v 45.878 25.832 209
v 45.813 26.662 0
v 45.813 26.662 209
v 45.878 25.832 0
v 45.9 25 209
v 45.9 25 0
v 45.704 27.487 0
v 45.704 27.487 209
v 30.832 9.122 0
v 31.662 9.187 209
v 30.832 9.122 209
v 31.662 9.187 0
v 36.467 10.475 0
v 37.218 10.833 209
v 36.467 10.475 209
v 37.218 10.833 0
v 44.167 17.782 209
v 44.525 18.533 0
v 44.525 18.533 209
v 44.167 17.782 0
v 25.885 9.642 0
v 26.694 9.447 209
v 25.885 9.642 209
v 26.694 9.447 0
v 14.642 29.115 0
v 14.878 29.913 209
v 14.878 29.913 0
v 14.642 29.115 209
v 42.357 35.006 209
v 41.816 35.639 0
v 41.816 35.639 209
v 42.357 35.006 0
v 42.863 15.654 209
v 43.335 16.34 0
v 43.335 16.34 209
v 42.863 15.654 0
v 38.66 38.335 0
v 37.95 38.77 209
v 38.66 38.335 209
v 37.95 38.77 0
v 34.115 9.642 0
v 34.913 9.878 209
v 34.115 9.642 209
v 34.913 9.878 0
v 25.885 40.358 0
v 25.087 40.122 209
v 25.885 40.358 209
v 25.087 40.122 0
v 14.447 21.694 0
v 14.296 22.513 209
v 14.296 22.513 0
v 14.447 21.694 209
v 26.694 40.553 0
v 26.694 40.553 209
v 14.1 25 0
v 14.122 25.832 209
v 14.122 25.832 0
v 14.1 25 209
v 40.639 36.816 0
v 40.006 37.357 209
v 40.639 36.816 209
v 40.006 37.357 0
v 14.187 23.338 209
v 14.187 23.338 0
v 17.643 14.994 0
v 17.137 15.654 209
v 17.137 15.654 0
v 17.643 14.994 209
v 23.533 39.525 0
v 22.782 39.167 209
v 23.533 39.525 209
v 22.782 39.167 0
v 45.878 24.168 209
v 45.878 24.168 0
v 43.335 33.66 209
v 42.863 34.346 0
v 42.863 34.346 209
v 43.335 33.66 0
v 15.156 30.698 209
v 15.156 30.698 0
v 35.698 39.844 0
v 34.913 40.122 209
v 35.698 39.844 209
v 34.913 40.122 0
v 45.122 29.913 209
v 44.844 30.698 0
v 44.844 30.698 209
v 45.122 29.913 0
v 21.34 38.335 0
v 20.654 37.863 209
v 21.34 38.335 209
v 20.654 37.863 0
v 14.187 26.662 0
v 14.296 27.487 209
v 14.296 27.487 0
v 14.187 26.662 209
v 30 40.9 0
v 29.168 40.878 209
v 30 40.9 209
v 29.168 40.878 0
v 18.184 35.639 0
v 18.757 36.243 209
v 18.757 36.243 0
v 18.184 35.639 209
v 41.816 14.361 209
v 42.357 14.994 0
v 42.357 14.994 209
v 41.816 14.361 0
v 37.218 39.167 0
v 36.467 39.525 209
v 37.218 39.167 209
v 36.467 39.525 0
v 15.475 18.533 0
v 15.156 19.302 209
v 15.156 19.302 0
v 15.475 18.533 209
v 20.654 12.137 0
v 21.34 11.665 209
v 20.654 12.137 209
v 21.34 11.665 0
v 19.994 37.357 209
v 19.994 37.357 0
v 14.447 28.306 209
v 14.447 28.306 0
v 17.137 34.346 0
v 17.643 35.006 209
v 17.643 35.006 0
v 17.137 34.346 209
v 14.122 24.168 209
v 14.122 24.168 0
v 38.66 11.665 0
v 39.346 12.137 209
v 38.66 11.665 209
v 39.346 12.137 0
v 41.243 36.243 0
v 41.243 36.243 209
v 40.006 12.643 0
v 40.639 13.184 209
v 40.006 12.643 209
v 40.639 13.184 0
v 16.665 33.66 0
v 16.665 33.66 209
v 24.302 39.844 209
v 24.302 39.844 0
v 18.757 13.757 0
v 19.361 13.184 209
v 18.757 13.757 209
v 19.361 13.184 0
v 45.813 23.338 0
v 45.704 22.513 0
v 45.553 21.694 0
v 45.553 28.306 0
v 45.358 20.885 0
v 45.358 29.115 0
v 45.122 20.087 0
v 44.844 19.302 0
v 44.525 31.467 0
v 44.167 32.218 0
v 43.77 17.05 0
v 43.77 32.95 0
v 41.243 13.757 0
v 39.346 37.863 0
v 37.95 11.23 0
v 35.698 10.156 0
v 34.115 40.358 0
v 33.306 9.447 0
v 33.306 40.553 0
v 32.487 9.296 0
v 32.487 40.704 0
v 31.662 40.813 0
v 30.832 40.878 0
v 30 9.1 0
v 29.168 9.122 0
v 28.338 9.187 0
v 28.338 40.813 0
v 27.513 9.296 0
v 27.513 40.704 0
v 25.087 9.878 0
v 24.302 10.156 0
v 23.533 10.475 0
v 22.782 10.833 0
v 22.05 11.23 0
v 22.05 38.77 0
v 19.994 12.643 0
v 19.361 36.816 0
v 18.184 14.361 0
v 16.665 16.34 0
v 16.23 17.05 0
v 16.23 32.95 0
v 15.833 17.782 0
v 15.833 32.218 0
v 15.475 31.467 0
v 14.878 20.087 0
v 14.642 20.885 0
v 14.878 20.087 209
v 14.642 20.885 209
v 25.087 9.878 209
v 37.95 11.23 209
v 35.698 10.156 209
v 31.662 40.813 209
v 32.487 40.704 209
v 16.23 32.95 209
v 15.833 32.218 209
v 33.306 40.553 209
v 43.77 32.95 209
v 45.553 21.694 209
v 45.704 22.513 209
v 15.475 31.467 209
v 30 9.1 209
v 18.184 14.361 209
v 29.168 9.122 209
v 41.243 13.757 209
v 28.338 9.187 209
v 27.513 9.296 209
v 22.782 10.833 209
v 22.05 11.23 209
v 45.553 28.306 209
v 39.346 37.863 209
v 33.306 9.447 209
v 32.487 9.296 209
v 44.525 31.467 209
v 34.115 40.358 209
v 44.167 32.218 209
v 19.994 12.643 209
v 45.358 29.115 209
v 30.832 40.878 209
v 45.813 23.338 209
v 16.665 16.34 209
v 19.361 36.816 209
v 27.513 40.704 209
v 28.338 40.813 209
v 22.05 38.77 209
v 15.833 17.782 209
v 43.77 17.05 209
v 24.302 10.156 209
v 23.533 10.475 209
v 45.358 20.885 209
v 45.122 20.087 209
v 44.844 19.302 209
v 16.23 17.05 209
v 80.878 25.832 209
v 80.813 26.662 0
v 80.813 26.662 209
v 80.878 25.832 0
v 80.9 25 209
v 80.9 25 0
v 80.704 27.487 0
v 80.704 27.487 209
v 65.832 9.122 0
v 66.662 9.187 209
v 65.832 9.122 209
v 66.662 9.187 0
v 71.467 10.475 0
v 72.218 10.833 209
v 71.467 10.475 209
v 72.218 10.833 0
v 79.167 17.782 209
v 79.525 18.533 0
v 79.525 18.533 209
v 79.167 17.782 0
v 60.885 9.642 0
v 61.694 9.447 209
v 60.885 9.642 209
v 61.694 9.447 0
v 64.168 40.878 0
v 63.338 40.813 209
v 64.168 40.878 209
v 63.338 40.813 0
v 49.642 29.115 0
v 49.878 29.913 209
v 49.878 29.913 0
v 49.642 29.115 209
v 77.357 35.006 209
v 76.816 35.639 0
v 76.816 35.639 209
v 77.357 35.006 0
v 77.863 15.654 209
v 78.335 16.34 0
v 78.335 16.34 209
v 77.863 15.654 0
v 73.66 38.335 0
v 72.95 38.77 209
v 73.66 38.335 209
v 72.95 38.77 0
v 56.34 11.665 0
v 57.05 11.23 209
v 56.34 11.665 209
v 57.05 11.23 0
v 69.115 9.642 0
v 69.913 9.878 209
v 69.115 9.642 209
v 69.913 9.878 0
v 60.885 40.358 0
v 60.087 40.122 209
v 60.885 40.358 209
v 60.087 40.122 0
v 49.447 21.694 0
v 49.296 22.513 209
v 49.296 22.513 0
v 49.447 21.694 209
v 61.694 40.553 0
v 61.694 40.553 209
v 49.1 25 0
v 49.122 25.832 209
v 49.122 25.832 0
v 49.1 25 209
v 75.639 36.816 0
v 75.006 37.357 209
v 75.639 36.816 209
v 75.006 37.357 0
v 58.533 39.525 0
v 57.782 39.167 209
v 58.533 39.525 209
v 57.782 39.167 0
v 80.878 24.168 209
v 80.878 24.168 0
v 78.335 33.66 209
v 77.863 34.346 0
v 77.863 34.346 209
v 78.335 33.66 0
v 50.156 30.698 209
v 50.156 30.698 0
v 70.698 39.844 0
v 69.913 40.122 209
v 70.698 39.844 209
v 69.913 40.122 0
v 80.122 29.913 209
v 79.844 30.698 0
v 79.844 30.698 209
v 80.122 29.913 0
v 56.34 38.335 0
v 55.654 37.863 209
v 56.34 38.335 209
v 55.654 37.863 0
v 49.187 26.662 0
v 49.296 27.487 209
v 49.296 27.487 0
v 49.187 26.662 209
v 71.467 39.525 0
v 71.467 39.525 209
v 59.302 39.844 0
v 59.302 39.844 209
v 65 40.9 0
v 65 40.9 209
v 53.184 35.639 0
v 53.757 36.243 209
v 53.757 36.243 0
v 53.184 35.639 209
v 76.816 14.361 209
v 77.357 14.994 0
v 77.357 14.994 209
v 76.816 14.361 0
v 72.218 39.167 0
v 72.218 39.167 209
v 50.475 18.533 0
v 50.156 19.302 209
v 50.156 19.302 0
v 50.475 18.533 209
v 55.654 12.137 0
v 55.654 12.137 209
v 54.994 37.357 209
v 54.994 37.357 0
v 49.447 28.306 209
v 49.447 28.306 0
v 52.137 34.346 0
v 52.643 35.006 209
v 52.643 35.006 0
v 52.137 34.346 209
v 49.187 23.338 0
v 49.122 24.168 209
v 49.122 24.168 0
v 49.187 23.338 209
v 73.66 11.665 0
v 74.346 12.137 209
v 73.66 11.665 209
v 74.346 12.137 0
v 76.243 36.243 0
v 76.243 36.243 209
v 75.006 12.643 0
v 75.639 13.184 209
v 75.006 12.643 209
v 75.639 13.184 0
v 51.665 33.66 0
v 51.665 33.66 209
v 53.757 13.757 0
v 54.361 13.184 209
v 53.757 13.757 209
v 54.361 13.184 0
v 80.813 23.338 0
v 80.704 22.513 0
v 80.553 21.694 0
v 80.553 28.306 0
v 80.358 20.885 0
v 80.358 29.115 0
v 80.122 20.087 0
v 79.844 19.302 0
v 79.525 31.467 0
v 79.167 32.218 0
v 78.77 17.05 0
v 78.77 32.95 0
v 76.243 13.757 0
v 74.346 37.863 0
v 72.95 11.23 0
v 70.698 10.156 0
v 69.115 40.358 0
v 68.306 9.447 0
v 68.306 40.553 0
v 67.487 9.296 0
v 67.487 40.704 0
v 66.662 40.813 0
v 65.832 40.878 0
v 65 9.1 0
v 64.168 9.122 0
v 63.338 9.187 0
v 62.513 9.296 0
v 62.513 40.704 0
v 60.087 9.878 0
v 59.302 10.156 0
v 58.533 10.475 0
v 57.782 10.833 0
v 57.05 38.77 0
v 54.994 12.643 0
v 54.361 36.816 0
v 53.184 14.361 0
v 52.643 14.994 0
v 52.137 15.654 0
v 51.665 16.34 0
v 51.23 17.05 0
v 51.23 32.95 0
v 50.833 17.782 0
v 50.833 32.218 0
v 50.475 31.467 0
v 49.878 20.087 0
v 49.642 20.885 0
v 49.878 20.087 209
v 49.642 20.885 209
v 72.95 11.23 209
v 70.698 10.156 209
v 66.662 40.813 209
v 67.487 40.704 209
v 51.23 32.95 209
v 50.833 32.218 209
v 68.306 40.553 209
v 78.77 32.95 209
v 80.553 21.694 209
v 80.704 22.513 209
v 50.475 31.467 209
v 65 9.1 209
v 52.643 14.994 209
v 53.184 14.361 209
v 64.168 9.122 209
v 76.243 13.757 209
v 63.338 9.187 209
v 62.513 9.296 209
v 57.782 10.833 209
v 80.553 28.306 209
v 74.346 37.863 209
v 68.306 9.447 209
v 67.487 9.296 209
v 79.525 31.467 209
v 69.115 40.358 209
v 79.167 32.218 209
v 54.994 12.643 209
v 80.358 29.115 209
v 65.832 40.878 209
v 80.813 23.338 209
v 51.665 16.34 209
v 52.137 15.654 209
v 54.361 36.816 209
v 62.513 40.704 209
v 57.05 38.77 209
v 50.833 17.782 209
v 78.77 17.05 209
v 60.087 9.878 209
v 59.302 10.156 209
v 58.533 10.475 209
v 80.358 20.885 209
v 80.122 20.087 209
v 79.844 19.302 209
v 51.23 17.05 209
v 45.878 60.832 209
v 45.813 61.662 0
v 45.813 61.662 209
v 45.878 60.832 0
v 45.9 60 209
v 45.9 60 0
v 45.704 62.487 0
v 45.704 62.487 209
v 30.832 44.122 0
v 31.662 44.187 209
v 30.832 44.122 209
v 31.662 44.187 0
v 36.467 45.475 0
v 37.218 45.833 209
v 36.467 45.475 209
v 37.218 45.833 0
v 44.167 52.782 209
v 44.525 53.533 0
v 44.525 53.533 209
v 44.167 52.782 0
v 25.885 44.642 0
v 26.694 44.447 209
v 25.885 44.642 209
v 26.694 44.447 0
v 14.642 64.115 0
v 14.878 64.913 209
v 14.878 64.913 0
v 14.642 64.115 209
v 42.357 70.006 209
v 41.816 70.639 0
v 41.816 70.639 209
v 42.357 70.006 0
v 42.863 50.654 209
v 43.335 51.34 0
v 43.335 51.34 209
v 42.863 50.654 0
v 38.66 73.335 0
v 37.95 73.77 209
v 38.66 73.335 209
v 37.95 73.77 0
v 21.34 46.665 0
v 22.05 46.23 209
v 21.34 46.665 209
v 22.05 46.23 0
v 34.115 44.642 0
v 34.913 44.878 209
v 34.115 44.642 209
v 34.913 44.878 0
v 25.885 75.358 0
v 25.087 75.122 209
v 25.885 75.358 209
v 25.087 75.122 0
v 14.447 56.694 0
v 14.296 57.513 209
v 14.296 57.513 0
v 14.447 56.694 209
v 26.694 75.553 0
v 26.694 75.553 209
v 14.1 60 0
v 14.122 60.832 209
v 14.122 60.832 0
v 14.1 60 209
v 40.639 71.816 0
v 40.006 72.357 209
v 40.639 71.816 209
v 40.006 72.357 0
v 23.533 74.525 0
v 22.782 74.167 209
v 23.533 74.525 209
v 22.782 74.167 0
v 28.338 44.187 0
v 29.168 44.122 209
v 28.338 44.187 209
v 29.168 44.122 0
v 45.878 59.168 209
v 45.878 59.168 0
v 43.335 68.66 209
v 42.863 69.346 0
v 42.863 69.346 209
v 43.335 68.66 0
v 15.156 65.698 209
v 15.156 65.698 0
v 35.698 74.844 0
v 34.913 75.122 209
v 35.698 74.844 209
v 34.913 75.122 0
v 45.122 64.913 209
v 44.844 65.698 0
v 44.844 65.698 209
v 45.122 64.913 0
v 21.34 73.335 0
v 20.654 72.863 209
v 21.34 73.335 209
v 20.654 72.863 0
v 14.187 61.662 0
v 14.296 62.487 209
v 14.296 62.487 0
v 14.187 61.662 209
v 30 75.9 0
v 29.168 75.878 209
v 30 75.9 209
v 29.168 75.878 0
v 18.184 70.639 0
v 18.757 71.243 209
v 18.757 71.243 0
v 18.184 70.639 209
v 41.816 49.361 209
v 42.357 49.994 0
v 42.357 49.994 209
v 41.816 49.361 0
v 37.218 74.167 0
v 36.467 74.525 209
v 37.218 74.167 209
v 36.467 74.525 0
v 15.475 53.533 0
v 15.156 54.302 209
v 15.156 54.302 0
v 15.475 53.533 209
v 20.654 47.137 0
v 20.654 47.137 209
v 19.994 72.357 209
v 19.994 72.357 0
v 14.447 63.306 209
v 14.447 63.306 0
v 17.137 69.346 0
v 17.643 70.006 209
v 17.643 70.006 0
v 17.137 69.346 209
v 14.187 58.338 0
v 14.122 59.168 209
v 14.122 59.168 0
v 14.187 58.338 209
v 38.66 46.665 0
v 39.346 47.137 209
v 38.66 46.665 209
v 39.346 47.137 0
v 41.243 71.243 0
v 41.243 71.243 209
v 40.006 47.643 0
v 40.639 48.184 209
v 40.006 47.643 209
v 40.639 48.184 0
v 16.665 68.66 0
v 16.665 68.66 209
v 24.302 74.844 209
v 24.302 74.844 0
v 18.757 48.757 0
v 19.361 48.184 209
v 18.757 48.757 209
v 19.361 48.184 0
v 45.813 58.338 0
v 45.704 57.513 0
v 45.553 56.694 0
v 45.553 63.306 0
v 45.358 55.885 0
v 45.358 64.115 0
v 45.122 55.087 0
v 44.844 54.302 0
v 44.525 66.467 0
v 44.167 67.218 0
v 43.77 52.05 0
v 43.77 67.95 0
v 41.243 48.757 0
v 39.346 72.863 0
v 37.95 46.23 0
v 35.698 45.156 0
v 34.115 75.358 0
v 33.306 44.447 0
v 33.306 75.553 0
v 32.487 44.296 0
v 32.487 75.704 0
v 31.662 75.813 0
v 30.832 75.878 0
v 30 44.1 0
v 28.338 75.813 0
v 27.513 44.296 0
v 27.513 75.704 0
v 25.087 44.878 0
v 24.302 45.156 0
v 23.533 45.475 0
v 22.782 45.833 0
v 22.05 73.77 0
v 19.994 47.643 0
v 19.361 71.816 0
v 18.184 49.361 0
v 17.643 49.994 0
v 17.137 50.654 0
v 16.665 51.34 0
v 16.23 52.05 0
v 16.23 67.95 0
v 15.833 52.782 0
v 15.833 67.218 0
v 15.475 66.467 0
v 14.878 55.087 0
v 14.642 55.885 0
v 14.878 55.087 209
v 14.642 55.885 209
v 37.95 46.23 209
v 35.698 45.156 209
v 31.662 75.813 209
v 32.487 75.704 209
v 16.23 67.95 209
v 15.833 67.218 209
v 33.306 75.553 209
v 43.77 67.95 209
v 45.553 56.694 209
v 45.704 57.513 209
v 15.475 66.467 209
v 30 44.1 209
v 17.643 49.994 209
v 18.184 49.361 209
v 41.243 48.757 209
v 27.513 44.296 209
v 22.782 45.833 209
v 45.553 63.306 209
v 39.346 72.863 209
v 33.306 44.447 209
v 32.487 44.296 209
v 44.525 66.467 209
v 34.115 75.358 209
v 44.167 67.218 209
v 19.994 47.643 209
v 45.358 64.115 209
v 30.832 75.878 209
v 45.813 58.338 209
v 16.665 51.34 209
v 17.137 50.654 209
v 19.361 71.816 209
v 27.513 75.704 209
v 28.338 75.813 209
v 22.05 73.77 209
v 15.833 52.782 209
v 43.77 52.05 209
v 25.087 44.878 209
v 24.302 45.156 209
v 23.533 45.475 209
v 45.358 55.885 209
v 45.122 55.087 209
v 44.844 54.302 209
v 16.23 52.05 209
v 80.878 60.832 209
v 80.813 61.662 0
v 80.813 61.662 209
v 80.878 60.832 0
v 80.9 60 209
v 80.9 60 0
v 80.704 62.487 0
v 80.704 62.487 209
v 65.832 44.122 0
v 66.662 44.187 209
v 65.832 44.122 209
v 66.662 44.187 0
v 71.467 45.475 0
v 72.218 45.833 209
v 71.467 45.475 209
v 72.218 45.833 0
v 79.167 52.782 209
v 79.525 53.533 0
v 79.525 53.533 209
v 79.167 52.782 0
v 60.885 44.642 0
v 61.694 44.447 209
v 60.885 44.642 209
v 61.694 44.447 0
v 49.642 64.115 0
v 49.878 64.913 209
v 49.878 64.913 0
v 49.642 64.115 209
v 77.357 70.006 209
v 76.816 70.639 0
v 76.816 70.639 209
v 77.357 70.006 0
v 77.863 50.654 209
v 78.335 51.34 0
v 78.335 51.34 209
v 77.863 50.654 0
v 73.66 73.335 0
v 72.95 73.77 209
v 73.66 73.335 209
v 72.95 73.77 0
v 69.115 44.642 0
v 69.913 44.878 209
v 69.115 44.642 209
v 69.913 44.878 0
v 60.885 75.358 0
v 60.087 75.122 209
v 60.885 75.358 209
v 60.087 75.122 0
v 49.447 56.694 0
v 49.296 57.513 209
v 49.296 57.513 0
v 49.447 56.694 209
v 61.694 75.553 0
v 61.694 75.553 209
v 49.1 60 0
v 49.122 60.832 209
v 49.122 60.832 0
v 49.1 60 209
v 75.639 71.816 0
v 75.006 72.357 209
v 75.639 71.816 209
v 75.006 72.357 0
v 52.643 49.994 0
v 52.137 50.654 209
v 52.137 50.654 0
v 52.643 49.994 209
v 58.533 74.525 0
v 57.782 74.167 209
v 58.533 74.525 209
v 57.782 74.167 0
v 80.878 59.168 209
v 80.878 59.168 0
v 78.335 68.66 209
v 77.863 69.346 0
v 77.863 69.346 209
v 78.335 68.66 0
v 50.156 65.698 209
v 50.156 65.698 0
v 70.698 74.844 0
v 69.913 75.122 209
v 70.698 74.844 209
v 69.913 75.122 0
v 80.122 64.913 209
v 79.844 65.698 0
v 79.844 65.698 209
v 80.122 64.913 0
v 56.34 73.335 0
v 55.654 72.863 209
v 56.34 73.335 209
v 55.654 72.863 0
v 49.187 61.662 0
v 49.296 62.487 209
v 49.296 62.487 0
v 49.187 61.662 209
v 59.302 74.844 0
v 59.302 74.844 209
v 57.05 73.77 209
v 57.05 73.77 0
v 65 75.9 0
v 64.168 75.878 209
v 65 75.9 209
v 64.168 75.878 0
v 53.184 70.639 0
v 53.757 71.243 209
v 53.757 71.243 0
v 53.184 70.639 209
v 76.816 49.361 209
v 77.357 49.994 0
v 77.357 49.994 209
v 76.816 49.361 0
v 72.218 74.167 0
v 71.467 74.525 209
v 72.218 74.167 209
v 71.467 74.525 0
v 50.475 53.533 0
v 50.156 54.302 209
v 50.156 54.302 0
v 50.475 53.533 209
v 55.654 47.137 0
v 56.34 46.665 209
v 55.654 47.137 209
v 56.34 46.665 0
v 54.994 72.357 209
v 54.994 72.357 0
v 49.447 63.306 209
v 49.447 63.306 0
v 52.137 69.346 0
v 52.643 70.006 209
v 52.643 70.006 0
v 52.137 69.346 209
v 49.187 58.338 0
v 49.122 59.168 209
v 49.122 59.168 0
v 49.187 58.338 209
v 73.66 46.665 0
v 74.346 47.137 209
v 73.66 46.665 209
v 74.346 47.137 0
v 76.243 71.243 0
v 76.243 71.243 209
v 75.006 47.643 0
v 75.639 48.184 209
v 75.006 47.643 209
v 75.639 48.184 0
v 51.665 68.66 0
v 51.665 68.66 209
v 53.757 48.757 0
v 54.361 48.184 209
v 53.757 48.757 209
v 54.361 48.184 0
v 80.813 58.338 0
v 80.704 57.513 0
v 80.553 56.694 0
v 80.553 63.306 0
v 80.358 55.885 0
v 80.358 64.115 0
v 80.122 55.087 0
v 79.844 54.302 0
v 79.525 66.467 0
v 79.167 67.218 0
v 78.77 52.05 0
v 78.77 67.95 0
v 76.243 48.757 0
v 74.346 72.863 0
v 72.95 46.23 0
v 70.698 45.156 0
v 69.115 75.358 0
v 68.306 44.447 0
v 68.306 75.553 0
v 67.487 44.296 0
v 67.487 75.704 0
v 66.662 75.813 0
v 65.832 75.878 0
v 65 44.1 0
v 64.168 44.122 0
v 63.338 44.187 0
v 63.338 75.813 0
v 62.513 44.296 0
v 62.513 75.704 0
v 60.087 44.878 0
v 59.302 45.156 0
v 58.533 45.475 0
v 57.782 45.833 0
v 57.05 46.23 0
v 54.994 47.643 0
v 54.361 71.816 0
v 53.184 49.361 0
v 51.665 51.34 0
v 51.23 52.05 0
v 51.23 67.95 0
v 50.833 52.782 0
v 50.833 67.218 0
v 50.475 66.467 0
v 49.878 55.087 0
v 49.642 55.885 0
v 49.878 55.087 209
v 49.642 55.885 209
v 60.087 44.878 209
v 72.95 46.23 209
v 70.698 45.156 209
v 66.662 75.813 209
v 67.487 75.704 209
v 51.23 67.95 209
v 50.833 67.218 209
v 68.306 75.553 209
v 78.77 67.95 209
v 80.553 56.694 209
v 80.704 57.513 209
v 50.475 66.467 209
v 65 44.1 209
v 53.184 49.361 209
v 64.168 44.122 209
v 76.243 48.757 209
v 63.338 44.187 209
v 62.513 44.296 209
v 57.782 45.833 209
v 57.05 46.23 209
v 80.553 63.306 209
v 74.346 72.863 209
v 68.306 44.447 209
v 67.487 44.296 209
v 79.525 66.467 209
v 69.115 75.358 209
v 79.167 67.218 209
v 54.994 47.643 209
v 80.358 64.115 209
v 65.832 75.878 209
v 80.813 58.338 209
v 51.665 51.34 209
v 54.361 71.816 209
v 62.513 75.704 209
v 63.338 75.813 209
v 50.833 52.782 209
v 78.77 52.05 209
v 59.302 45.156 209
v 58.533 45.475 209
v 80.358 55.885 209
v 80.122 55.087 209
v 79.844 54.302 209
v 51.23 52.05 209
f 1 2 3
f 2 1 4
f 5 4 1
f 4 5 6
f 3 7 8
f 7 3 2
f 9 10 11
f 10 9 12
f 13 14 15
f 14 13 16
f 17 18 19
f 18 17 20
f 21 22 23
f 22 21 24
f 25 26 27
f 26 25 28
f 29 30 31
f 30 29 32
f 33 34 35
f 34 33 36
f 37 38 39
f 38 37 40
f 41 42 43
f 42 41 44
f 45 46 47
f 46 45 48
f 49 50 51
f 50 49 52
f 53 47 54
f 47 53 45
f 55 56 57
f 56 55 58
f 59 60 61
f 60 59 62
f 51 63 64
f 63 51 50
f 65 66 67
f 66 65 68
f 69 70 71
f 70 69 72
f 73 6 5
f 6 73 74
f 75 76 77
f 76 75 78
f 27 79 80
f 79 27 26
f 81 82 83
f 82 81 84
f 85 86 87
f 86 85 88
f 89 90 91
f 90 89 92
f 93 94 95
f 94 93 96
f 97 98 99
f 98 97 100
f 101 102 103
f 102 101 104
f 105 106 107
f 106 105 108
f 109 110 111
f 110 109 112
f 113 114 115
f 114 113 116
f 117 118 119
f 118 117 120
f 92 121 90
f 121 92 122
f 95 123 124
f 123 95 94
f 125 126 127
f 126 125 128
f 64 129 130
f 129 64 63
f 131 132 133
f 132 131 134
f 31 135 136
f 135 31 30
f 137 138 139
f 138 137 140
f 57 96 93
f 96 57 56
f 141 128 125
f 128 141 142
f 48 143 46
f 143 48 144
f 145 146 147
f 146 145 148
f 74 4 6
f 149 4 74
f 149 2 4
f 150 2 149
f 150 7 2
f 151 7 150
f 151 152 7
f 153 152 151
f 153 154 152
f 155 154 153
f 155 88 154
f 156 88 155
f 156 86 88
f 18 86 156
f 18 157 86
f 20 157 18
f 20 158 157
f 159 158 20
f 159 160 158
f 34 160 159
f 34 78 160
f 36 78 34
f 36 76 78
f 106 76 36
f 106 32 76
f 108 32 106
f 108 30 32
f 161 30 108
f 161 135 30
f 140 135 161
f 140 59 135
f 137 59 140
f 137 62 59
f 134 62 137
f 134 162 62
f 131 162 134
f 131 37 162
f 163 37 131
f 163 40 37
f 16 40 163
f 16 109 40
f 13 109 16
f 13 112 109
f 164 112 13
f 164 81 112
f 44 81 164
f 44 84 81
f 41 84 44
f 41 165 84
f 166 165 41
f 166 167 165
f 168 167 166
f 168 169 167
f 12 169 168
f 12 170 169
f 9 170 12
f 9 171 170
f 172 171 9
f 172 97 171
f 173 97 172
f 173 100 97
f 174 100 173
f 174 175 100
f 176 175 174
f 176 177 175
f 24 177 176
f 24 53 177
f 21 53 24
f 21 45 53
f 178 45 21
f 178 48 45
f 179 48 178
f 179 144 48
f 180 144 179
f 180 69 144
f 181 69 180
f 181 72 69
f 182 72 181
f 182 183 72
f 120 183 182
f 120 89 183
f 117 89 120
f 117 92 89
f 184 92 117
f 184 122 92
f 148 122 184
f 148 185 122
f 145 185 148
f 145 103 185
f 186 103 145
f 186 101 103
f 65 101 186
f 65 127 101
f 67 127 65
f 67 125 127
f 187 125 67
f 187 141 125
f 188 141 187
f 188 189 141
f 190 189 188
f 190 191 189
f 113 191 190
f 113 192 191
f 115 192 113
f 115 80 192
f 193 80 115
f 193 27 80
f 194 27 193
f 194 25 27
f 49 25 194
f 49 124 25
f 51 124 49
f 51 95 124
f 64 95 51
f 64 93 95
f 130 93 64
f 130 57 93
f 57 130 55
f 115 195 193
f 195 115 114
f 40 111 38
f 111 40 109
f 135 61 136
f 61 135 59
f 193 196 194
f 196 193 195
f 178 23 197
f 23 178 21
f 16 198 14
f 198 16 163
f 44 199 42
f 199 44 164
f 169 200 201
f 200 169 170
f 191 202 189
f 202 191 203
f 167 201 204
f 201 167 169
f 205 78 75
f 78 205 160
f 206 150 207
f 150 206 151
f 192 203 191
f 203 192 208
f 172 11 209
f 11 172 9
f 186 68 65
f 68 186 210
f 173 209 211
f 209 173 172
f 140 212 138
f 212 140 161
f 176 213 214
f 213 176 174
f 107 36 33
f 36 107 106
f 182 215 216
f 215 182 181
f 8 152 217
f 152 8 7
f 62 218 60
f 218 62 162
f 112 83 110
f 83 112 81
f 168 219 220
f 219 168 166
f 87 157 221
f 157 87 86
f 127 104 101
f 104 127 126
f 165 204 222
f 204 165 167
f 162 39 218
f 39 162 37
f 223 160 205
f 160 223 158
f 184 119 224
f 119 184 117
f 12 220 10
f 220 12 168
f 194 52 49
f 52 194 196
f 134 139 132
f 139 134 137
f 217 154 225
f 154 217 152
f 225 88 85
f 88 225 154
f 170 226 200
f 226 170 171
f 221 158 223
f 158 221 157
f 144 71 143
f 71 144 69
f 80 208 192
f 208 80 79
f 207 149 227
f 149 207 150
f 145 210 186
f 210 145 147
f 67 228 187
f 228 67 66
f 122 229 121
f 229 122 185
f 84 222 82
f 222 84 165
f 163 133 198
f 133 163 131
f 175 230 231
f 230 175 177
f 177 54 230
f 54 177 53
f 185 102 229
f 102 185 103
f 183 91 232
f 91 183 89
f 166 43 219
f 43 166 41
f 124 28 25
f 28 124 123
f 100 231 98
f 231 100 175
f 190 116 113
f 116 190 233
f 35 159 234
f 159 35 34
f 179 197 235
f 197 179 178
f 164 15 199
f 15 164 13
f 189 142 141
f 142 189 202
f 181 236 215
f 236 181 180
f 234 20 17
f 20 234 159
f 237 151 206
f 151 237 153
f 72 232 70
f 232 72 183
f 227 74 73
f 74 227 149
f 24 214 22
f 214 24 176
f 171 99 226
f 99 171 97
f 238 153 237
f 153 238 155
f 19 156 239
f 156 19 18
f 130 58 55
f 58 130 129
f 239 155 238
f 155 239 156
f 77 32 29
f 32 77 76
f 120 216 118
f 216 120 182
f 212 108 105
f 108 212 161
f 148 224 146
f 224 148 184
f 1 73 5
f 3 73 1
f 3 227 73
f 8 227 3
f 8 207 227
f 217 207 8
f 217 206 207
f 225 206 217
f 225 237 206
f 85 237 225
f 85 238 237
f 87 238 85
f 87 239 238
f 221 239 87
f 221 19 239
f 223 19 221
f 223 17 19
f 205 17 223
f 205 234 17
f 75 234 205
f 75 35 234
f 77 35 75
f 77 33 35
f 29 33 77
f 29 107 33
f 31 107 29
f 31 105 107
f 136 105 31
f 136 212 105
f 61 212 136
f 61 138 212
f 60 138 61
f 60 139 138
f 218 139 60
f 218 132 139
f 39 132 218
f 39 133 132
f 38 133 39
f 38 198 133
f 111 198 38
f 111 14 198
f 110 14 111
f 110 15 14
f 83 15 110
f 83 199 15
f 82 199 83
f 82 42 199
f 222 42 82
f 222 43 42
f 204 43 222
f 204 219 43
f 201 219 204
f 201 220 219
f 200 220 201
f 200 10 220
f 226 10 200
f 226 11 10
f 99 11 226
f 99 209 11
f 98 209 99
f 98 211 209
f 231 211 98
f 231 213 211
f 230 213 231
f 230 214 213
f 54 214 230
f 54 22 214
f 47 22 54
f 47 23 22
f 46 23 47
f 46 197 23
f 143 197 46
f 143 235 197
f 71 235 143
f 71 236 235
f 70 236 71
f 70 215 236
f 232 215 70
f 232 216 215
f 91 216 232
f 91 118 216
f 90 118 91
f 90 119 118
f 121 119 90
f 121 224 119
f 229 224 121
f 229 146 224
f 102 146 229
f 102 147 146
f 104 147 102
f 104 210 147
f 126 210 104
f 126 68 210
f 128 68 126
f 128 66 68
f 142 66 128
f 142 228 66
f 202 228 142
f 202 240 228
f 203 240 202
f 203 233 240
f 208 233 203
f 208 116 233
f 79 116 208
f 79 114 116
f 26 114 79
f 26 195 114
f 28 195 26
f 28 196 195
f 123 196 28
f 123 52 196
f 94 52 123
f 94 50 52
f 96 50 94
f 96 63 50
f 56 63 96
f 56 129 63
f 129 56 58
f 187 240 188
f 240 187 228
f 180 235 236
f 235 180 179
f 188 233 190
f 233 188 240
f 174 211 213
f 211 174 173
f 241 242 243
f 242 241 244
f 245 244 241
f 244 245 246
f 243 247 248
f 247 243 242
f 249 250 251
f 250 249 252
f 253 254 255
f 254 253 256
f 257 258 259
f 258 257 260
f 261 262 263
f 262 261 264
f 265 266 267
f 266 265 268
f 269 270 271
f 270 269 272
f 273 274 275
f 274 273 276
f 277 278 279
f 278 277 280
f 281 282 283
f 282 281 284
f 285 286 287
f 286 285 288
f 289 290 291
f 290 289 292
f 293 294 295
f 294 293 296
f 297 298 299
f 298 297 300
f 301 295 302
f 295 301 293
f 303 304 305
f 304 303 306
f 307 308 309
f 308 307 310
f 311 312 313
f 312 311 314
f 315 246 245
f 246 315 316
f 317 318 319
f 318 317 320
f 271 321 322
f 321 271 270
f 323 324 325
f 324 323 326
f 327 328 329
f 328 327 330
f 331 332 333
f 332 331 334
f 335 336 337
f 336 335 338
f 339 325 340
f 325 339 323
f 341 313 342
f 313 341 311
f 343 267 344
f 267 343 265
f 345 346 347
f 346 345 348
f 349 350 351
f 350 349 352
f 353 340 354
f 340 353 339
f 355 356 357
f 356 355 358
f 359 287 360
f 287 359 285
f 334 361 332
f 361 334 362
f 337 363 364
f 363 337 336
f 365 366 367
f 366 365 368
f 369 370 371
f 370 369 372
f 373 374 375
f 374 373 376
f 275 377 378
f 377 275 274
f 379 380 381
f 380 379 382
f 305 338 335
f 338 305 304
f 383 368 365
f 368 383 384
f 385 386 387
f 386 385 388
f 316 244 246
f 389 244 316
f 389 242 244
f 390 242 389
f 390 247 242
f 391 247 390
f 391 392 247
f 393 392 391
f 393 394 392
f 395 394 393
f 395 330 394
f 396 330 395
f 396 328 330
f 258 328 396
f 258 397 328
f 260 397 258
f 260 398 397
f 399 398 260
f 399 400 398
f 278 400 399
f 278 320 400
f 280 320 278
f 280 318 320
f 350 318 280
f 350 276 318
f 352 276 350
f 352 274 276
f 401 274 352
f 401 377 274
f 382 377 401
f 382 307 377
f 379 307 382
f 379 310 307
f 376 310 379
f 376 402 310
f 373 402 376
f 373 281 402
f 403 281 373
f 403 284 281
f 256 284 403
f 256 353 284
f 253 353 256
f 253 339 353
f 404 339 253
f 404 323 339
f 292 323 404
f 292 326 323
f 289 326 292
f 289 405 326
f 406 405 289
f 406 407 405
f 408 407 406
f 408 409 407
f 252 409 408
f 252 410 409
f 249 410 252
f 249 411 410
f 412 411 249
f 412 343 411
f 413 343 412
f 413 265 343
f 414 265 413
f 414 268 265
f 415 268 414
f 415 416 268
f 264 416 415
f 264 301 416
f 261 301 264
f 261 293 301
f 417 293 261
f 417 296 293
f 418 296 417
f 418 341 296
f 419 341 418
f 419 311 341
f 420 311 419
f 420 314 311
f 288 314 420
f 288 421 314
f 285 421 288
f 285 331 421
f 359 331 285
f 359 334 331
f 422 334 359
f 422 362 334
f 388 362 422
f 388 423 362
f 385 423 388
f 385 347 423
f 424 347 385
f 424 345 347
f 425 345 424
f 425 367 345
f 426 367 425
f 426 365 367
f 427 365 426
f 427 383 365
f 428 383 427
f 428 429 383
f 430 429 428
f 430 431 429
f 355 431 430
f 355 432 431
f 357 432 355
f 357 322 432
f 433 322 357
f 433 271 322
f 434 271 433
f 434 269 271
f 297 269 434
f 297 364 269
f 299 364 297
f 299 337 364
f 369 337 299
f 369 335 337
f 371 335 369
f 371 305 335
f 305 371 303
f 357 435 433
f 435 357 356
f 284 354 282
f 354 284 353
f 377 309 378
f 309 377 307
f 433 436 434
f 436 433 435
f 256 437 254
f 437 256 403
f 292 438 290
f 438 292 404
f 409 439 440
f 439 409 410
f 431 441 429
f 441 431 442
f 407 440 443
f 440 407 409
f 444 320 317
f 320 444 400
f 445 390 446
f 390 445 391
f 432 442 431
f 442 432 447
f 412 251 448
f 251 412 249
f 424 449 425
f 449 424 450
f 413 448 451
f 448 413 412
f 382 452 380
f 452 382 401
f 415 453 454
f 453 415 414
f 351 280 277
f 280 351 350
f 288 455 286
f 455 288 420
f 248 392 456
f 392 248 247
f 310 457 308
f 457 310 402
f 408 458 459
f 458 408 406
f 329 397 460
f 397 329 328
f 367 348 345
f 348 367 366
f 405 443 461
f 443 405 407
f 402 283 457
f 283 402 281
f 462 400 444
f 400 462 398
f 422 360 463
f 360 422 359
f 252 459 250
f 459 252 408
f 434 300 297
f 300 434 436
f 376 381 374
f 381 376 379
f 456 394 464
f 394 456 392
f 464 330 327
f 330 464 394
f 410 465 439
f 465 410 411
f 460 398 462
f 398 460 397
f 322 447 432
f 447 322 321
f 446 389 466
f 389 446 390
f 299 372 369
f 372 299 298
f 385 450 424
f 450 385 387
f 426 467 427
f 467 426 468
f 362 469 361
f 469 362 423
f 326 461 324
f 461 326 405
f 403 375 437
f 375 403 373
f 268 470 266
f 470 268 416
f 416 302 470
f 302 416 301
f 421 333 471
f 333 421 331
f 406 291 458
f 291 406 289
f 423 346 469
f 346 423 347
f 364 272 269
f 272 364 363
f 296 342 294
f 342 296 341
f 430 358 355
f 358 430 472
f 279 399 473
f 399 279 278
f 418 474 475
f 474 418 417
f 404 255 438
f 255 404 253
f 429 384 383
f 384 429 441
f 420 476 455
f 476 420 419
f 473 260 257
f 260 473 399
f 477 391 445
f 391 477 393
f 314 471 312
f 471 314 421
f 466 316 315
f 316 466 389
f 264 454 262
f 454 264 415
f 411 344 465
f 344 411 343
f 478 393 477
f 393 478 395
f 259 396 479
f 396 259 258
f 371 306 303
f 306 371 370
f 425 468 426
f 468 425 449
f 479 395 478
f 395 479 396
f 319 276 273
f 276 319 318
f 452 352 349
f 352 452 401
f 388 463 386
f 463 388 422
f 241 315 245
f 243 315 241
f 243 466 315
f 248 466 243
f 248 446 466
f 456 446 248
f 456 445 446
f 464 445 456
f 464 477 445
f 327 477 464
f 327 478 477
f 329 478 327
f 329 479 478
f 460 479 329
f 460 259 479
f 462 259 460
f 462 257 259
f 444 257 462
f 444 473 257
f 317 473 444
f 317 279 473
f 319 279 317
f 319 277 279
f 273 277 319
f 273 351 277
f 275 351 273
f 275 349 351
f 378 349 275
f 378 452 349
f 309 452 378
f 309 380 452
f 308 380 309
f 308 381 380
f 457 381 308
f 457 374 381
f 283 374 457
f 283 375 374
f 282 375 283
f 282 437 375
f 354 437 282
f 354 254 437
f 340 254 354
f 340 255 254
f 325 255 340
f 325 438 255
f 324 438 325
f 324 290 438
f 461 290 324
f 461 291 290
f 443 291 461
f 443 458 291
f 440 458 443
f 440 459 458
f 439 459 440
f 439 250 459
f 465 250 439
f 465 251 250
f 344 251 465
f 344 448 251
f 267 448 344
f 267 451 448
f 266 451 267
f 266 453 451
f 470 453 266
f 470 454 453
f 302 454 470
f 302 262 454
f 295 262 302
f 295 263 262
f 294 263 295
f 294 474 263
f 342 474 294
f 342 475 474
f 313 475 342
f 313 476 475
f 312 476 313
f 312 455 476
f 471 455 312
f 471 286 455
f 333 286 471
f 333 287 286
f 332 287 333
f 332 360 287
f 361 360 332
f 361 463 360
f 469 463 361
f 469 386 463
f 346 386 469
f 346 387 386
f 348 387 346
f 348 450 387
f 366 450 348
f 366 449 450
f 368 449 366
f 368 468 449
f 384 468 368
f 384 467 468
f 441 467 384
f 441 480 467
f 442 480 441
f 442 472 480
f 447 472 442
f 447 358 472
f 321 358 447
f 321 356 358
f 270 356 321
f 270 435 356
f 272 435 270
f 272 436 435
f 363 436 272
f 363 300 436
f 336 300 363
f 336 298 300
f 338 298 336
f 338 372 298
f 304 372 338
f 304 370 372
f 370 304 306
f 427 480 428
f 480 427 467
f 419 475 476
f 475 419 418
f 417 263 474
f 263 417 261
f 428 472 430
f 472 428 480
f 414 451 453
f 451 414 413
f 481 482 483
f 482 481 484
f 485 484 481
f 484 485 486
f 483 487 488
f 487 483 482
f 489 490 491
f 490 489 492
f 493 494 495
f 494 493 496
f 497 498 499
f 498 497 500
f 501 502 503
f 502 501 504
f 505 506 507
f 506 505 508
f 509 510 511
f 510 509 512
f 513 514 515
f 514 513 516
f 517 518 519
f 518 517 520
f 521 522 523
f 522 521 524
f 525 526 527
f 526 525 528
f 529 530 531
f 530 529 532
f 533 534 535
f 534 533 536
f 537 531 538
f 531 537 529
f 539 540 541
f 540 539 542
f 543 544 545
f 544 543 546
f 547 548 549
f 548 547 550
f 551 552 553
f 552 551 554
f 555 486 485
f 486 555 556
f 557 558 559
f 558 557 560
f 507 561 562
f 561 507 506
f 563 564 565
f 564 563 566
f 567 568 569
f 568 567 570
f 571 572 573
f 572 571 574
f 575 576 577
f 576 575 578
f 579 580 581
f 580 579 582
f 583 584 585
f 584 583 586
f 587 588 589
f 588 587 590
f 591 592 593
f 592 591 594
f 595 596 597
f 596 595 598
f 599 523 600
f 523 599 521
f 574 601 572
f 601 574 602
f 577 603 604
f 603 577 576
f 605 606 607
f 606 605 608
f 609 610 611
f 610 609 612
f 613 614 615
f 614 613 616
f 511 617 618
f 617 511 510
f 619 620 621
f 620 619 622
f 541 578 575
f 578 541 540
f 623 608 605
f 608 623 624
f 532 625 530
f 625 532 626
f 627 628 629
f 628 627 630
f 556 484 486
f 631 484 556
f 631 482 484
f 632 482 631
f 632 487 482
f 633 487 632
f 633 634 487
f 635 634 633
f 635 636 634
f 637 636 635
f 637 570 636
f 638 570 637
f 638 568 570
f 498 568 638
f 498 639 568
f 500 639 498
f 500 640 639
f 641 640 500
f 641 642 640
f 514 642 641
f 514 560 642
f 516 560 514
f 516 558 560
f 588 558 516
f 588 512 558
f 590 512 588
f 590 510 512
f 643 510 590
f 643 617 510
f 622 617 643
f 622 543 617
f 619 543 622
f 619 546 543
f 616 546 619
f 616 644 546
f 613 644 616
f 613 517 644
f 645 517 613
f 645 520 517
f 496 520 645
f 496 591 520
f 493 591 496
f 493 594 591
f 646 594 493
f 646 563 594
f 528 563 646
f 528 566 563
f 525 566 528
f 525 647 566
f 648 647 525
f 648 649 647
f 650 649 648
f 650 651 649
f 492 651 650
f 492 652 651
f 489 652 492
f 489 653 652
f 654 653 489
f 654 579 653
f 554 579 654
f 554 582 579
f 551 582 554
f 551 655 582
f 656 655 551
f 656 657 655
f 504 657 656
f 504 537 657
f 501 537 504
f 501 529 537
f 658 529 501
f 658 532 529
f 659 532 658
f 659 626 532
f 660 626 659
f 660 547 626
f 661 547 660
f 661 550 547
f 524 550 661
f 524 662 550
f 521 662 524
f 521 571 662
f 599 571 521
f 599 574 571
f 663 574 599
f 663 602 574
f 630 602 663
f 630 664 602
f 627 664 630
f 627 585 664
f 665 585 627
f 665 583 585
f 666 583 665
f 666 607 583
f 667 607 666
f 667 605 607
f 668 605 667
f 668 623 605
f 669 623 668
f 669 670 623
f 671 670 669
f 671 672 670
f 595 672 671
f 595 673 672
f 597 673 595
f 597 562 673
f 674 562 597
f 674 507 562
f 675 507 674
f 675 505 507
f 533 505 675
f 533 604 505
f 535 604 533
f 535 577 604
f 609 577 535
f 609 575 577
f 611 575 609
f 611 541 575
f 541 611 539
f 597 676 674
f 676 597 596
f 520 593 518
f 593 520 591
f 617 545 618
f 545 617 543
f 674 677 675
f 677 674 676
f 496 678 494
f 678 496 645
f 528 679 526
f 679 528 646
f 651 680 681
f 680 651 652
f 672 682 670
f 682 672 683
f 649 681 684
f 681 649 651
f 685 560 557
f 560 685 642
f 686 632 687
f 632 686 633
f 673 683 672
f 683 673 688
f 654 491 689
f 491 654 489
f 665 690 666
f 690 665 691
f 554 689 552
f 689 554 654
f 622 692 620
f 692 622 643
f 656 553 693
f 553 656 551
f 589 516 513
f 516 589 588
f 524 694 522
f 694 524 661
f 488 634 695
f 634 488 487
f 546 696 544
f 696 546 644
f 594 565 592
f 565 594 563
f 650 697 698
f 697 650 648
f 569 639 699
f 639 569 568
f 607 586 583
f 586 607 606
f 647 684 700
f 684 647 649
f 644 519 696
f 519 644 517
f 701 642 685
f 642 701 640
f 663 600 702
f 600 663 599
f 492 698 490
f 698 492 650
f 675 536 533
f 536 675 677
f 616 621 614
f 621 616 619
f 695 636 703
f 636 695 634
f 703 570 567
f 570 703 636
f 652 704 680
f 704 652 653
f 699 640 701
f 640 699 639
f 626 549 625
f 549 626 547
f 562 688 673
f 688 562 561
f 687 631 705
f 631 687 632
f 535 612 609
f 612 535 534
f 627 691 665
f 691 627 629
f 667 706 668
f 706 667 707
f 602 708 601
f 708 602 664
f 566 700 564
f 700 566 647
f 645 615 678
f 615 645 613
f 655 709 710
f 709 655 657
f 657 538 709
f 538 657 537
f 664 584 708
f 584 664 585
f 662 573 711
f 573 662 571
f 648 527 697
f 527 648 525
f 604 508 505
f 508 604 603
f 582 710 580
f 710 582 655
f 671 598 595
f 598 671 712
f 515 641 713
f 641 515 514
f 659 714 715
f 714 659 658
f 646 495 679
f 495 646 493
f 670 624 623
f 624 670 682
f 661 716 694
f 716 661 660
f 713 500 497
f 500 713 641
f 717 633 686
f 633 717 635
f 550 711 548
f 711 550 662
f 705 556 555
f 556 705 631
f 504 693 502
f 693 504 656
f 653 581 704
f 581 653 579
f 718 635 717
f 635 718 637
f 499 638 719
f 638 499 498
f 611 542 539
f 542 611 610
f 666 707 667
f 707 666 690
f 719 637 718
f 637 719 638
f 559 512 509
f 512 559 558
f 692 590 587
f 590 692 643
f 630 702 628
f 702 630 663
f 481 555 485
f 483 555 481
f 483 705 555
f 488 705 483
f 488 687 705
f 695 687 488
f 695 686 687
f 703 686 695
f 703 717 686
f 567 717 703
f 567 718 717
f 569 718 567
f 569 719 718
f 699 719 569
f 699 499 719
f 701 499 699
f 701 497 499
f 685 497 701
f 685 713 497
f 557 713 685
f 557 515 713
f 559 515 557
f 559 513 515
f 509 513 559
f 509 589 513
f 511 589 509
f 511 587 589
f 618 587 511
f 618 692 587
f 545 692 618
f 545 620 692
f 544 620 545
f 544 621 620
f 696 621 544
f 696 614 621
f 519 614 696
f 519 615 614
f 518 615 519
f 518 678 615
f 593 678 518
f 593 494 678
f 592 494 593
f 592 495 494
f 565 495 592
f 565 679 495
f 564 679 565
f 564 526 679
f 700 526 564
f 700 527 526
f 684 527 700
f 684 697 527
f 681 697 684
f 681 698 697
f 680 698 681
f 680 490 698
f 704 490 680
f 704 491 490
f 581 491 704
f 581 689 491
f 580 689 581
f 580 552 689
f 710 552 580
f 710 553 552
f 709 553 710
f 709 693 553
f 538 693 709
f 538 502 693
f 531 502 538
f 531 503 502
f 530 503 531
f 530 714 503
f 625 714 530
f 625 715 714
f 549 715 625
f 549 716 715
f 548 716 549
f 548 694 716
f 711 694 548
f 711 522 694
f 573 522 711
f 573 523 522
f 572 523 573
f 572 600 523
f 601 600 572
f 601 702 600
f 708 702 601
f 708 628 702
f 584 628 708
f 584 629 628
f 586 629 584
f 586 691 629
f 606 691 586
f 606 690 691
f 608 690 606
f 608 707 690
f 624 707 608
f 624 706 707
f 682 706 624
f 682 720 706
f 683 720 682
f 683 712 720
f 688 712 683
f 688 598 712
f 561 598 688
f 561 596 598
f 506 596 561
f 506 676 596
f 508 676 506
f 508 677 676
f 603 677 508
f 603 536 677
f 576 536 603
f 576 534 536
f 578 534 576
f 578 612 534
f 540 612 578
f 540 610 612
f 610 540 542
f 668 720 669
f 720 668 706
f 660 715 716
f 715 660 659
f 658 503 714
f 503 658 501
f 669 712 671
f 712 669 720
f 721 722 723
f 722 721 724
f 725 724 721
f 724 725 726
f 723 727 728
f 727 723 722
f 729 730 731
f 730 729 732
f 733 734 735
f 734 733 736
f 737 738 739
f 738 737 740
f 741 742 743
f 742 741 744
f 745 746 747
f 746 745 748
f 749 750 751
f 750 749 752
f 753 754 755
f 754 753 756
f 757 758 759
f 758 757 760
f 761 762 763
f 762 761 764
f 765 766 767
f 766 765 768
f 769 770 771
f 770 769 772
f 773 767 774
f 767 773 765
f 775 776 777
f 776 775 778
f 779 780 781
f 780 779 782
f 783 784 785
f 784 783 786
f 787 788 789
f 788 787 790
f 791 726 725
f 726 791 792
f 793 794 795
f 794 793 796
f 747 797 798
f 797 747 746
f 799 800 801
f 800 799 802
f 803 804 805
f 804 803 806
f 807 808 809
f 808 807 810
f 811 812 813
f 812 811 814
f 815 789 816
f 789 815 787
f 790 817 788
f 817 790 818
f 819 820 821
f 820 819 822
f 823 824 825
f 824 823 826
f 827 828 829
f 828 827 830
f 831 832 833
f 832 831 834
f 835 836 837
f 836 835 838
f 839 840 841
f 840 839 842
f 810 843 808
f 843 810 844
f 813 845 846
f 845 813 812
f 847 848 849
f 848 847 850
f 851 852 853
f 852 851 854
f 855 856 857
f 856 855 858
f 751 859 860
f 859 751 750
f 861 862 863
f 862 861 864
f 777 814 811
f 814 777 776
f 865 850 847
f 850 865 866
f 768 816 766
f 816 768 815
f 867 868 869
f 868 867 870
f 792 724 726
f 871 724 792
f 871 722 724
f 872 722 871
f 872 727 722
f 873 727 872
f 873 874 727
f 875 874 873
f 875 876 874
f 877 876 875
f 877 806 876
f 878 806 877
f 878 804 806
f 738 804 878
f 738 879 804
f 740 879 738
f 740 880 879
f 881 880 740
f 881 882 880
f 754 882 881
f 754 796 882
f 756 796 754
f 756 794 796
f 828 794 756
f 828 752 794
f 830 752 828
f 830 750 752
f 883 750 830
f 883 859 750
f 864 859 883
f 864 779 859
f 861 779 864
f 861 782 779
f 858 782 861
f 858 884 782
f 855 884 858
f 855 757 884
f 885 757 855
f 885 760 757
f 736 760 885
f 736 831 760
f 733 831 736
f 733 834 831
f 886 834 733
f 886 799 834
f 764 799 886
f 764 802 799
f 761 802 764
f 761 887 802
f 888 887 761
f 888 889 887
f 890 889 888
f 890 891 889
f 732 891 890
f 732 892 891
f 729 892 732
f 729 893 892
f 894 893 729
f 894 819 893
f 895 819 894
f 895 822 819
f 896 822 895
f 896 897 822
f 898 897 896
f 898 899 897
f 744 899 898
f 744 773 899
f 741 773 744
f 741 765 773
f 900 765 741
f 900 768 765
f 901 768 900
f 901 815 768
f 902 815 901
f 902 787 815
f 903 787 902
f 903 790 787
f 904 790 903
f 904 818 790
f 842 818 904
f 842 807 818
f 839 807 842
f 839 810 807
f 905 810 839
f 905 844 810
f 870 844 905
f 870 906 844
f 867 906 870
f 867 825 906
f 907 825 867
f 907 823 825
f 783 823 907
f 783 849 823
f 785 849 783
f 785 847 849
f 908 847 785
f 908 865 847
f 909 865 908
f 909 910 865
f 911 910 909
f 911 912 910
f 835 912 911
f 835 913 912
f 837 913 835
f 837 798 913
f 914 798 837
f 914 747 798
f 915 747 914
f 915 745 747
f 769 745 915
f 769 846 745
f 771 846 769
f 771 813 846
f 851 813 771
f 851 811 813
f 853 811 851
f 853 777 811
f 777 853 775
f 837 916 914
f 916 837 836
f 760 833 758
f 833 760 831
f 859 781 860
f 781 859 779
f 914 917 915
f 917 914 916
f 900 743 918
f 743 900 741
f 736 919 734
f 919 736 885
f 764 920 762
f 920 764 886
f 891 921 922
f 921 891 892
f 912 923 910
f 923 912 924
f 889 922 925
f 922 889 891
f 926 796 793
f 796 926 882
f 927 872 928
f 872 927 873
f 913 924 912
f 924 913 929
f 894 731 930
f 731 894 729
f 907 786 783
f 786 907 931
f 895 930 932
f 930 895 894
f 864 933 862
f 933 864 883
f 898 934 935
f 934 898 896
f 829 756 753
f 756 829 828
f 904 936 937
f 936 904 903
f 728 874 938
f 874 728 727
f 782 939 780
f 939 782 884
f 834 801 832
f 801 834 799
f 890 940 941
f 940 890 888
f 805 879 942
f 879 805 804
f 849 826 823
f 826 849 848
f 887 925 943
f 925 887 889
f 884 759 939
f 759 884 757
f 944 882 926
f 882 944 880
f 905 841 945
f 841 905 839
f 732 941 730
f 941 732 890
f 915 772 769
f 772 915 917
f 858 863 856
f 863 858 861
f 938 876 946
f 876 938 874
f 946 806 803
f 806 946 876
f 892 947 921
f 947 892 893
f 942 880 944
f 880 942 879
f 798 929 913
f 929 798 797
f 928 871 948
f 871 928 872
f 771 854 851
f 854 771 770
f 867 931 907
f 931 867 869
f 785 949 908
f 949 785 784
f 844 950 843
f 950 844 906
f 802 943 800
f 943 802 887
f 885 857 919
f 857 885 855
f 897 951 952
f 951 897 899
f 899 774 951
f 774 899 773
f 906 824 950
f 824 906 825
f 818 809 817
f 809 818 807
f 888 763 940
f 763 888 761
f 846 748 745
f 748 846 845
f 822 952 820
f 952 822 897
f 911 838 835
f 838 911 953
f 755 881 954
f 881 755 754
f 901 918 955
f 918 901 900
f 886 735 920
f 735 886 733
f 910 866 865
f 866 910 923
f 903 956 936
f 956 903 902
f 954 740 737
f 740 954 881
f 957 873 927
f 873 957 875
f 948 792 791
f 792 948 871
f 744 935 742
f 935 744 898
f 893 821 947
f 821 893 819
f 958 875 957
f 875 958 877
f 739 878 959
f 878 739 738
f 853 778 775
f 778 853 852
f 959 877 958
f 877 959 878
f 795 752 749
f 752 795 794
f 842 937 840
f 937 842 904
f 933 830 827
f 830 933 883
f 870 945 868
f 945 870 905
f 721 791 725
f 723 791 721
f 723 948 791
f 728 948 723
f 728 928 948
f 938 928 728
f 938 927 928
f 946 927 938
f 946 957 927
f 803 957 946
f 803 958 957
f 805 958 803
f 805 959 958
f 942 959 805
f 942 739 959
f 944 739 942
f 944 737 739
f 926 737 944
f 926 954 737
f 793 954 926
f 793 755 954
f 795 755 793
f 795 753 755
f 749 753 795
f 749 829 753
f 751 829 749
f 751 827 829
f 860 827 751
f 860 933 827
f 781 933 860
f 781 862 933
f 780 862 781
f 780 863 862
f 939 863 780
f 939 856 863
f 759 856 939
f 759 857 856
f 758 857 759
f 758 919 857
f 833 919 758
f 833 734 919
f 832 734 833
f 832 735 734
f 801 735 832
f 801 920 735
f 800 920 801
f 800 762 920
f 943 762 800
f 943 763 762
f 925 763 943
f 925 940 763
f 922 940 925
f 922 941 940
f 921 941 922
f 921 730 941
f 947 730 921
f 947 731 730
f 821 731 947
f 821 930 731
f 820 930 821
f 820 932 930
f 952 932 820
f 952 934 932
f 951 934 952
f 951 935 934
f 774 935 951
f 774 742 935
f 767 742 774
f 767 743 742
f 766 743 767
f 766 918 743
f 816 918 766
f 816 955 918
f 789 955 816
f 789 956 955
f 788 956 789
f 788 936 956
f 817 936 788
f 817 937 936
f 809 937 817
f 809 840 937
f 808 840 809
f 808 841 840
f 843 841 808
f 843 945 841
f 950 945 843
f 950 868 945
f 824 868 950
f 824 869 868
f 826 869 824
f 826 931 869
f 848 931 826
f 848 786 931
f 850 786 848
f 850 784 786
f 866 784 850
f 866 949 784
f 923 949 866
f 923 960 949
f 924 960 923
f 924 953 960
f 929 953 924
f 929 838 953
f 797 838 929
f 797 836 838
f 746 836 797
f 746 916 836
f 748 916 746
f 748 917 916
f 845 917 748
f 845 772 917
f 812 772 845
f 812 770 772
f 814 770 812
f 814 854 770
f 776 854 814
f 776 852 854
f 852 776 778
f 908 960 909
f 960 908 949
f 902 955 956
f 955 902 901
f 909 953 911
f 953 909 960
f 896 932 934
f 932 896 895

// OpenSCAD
// Build Volume 250 x 210 x 210 mm

//200 x 273, 2 slack, 3 rim

$fn=120;

width=210;
length=200;
base_thickness=3;
support_radius=15.9;

difference() {

    // adds
    union() {
        translate([30,25,0]) cylinder(h=209,r=support_radius);
        translate([65,25,0]) cylinder(h=209,r=support_radius);
        translate([30,60,0]) cylinder(h=209,r=support_radius);
        translate([65,60,0]) cylinder(h=209,r=support_radius);
    }

    // subtracts
    union() {
    }


}
